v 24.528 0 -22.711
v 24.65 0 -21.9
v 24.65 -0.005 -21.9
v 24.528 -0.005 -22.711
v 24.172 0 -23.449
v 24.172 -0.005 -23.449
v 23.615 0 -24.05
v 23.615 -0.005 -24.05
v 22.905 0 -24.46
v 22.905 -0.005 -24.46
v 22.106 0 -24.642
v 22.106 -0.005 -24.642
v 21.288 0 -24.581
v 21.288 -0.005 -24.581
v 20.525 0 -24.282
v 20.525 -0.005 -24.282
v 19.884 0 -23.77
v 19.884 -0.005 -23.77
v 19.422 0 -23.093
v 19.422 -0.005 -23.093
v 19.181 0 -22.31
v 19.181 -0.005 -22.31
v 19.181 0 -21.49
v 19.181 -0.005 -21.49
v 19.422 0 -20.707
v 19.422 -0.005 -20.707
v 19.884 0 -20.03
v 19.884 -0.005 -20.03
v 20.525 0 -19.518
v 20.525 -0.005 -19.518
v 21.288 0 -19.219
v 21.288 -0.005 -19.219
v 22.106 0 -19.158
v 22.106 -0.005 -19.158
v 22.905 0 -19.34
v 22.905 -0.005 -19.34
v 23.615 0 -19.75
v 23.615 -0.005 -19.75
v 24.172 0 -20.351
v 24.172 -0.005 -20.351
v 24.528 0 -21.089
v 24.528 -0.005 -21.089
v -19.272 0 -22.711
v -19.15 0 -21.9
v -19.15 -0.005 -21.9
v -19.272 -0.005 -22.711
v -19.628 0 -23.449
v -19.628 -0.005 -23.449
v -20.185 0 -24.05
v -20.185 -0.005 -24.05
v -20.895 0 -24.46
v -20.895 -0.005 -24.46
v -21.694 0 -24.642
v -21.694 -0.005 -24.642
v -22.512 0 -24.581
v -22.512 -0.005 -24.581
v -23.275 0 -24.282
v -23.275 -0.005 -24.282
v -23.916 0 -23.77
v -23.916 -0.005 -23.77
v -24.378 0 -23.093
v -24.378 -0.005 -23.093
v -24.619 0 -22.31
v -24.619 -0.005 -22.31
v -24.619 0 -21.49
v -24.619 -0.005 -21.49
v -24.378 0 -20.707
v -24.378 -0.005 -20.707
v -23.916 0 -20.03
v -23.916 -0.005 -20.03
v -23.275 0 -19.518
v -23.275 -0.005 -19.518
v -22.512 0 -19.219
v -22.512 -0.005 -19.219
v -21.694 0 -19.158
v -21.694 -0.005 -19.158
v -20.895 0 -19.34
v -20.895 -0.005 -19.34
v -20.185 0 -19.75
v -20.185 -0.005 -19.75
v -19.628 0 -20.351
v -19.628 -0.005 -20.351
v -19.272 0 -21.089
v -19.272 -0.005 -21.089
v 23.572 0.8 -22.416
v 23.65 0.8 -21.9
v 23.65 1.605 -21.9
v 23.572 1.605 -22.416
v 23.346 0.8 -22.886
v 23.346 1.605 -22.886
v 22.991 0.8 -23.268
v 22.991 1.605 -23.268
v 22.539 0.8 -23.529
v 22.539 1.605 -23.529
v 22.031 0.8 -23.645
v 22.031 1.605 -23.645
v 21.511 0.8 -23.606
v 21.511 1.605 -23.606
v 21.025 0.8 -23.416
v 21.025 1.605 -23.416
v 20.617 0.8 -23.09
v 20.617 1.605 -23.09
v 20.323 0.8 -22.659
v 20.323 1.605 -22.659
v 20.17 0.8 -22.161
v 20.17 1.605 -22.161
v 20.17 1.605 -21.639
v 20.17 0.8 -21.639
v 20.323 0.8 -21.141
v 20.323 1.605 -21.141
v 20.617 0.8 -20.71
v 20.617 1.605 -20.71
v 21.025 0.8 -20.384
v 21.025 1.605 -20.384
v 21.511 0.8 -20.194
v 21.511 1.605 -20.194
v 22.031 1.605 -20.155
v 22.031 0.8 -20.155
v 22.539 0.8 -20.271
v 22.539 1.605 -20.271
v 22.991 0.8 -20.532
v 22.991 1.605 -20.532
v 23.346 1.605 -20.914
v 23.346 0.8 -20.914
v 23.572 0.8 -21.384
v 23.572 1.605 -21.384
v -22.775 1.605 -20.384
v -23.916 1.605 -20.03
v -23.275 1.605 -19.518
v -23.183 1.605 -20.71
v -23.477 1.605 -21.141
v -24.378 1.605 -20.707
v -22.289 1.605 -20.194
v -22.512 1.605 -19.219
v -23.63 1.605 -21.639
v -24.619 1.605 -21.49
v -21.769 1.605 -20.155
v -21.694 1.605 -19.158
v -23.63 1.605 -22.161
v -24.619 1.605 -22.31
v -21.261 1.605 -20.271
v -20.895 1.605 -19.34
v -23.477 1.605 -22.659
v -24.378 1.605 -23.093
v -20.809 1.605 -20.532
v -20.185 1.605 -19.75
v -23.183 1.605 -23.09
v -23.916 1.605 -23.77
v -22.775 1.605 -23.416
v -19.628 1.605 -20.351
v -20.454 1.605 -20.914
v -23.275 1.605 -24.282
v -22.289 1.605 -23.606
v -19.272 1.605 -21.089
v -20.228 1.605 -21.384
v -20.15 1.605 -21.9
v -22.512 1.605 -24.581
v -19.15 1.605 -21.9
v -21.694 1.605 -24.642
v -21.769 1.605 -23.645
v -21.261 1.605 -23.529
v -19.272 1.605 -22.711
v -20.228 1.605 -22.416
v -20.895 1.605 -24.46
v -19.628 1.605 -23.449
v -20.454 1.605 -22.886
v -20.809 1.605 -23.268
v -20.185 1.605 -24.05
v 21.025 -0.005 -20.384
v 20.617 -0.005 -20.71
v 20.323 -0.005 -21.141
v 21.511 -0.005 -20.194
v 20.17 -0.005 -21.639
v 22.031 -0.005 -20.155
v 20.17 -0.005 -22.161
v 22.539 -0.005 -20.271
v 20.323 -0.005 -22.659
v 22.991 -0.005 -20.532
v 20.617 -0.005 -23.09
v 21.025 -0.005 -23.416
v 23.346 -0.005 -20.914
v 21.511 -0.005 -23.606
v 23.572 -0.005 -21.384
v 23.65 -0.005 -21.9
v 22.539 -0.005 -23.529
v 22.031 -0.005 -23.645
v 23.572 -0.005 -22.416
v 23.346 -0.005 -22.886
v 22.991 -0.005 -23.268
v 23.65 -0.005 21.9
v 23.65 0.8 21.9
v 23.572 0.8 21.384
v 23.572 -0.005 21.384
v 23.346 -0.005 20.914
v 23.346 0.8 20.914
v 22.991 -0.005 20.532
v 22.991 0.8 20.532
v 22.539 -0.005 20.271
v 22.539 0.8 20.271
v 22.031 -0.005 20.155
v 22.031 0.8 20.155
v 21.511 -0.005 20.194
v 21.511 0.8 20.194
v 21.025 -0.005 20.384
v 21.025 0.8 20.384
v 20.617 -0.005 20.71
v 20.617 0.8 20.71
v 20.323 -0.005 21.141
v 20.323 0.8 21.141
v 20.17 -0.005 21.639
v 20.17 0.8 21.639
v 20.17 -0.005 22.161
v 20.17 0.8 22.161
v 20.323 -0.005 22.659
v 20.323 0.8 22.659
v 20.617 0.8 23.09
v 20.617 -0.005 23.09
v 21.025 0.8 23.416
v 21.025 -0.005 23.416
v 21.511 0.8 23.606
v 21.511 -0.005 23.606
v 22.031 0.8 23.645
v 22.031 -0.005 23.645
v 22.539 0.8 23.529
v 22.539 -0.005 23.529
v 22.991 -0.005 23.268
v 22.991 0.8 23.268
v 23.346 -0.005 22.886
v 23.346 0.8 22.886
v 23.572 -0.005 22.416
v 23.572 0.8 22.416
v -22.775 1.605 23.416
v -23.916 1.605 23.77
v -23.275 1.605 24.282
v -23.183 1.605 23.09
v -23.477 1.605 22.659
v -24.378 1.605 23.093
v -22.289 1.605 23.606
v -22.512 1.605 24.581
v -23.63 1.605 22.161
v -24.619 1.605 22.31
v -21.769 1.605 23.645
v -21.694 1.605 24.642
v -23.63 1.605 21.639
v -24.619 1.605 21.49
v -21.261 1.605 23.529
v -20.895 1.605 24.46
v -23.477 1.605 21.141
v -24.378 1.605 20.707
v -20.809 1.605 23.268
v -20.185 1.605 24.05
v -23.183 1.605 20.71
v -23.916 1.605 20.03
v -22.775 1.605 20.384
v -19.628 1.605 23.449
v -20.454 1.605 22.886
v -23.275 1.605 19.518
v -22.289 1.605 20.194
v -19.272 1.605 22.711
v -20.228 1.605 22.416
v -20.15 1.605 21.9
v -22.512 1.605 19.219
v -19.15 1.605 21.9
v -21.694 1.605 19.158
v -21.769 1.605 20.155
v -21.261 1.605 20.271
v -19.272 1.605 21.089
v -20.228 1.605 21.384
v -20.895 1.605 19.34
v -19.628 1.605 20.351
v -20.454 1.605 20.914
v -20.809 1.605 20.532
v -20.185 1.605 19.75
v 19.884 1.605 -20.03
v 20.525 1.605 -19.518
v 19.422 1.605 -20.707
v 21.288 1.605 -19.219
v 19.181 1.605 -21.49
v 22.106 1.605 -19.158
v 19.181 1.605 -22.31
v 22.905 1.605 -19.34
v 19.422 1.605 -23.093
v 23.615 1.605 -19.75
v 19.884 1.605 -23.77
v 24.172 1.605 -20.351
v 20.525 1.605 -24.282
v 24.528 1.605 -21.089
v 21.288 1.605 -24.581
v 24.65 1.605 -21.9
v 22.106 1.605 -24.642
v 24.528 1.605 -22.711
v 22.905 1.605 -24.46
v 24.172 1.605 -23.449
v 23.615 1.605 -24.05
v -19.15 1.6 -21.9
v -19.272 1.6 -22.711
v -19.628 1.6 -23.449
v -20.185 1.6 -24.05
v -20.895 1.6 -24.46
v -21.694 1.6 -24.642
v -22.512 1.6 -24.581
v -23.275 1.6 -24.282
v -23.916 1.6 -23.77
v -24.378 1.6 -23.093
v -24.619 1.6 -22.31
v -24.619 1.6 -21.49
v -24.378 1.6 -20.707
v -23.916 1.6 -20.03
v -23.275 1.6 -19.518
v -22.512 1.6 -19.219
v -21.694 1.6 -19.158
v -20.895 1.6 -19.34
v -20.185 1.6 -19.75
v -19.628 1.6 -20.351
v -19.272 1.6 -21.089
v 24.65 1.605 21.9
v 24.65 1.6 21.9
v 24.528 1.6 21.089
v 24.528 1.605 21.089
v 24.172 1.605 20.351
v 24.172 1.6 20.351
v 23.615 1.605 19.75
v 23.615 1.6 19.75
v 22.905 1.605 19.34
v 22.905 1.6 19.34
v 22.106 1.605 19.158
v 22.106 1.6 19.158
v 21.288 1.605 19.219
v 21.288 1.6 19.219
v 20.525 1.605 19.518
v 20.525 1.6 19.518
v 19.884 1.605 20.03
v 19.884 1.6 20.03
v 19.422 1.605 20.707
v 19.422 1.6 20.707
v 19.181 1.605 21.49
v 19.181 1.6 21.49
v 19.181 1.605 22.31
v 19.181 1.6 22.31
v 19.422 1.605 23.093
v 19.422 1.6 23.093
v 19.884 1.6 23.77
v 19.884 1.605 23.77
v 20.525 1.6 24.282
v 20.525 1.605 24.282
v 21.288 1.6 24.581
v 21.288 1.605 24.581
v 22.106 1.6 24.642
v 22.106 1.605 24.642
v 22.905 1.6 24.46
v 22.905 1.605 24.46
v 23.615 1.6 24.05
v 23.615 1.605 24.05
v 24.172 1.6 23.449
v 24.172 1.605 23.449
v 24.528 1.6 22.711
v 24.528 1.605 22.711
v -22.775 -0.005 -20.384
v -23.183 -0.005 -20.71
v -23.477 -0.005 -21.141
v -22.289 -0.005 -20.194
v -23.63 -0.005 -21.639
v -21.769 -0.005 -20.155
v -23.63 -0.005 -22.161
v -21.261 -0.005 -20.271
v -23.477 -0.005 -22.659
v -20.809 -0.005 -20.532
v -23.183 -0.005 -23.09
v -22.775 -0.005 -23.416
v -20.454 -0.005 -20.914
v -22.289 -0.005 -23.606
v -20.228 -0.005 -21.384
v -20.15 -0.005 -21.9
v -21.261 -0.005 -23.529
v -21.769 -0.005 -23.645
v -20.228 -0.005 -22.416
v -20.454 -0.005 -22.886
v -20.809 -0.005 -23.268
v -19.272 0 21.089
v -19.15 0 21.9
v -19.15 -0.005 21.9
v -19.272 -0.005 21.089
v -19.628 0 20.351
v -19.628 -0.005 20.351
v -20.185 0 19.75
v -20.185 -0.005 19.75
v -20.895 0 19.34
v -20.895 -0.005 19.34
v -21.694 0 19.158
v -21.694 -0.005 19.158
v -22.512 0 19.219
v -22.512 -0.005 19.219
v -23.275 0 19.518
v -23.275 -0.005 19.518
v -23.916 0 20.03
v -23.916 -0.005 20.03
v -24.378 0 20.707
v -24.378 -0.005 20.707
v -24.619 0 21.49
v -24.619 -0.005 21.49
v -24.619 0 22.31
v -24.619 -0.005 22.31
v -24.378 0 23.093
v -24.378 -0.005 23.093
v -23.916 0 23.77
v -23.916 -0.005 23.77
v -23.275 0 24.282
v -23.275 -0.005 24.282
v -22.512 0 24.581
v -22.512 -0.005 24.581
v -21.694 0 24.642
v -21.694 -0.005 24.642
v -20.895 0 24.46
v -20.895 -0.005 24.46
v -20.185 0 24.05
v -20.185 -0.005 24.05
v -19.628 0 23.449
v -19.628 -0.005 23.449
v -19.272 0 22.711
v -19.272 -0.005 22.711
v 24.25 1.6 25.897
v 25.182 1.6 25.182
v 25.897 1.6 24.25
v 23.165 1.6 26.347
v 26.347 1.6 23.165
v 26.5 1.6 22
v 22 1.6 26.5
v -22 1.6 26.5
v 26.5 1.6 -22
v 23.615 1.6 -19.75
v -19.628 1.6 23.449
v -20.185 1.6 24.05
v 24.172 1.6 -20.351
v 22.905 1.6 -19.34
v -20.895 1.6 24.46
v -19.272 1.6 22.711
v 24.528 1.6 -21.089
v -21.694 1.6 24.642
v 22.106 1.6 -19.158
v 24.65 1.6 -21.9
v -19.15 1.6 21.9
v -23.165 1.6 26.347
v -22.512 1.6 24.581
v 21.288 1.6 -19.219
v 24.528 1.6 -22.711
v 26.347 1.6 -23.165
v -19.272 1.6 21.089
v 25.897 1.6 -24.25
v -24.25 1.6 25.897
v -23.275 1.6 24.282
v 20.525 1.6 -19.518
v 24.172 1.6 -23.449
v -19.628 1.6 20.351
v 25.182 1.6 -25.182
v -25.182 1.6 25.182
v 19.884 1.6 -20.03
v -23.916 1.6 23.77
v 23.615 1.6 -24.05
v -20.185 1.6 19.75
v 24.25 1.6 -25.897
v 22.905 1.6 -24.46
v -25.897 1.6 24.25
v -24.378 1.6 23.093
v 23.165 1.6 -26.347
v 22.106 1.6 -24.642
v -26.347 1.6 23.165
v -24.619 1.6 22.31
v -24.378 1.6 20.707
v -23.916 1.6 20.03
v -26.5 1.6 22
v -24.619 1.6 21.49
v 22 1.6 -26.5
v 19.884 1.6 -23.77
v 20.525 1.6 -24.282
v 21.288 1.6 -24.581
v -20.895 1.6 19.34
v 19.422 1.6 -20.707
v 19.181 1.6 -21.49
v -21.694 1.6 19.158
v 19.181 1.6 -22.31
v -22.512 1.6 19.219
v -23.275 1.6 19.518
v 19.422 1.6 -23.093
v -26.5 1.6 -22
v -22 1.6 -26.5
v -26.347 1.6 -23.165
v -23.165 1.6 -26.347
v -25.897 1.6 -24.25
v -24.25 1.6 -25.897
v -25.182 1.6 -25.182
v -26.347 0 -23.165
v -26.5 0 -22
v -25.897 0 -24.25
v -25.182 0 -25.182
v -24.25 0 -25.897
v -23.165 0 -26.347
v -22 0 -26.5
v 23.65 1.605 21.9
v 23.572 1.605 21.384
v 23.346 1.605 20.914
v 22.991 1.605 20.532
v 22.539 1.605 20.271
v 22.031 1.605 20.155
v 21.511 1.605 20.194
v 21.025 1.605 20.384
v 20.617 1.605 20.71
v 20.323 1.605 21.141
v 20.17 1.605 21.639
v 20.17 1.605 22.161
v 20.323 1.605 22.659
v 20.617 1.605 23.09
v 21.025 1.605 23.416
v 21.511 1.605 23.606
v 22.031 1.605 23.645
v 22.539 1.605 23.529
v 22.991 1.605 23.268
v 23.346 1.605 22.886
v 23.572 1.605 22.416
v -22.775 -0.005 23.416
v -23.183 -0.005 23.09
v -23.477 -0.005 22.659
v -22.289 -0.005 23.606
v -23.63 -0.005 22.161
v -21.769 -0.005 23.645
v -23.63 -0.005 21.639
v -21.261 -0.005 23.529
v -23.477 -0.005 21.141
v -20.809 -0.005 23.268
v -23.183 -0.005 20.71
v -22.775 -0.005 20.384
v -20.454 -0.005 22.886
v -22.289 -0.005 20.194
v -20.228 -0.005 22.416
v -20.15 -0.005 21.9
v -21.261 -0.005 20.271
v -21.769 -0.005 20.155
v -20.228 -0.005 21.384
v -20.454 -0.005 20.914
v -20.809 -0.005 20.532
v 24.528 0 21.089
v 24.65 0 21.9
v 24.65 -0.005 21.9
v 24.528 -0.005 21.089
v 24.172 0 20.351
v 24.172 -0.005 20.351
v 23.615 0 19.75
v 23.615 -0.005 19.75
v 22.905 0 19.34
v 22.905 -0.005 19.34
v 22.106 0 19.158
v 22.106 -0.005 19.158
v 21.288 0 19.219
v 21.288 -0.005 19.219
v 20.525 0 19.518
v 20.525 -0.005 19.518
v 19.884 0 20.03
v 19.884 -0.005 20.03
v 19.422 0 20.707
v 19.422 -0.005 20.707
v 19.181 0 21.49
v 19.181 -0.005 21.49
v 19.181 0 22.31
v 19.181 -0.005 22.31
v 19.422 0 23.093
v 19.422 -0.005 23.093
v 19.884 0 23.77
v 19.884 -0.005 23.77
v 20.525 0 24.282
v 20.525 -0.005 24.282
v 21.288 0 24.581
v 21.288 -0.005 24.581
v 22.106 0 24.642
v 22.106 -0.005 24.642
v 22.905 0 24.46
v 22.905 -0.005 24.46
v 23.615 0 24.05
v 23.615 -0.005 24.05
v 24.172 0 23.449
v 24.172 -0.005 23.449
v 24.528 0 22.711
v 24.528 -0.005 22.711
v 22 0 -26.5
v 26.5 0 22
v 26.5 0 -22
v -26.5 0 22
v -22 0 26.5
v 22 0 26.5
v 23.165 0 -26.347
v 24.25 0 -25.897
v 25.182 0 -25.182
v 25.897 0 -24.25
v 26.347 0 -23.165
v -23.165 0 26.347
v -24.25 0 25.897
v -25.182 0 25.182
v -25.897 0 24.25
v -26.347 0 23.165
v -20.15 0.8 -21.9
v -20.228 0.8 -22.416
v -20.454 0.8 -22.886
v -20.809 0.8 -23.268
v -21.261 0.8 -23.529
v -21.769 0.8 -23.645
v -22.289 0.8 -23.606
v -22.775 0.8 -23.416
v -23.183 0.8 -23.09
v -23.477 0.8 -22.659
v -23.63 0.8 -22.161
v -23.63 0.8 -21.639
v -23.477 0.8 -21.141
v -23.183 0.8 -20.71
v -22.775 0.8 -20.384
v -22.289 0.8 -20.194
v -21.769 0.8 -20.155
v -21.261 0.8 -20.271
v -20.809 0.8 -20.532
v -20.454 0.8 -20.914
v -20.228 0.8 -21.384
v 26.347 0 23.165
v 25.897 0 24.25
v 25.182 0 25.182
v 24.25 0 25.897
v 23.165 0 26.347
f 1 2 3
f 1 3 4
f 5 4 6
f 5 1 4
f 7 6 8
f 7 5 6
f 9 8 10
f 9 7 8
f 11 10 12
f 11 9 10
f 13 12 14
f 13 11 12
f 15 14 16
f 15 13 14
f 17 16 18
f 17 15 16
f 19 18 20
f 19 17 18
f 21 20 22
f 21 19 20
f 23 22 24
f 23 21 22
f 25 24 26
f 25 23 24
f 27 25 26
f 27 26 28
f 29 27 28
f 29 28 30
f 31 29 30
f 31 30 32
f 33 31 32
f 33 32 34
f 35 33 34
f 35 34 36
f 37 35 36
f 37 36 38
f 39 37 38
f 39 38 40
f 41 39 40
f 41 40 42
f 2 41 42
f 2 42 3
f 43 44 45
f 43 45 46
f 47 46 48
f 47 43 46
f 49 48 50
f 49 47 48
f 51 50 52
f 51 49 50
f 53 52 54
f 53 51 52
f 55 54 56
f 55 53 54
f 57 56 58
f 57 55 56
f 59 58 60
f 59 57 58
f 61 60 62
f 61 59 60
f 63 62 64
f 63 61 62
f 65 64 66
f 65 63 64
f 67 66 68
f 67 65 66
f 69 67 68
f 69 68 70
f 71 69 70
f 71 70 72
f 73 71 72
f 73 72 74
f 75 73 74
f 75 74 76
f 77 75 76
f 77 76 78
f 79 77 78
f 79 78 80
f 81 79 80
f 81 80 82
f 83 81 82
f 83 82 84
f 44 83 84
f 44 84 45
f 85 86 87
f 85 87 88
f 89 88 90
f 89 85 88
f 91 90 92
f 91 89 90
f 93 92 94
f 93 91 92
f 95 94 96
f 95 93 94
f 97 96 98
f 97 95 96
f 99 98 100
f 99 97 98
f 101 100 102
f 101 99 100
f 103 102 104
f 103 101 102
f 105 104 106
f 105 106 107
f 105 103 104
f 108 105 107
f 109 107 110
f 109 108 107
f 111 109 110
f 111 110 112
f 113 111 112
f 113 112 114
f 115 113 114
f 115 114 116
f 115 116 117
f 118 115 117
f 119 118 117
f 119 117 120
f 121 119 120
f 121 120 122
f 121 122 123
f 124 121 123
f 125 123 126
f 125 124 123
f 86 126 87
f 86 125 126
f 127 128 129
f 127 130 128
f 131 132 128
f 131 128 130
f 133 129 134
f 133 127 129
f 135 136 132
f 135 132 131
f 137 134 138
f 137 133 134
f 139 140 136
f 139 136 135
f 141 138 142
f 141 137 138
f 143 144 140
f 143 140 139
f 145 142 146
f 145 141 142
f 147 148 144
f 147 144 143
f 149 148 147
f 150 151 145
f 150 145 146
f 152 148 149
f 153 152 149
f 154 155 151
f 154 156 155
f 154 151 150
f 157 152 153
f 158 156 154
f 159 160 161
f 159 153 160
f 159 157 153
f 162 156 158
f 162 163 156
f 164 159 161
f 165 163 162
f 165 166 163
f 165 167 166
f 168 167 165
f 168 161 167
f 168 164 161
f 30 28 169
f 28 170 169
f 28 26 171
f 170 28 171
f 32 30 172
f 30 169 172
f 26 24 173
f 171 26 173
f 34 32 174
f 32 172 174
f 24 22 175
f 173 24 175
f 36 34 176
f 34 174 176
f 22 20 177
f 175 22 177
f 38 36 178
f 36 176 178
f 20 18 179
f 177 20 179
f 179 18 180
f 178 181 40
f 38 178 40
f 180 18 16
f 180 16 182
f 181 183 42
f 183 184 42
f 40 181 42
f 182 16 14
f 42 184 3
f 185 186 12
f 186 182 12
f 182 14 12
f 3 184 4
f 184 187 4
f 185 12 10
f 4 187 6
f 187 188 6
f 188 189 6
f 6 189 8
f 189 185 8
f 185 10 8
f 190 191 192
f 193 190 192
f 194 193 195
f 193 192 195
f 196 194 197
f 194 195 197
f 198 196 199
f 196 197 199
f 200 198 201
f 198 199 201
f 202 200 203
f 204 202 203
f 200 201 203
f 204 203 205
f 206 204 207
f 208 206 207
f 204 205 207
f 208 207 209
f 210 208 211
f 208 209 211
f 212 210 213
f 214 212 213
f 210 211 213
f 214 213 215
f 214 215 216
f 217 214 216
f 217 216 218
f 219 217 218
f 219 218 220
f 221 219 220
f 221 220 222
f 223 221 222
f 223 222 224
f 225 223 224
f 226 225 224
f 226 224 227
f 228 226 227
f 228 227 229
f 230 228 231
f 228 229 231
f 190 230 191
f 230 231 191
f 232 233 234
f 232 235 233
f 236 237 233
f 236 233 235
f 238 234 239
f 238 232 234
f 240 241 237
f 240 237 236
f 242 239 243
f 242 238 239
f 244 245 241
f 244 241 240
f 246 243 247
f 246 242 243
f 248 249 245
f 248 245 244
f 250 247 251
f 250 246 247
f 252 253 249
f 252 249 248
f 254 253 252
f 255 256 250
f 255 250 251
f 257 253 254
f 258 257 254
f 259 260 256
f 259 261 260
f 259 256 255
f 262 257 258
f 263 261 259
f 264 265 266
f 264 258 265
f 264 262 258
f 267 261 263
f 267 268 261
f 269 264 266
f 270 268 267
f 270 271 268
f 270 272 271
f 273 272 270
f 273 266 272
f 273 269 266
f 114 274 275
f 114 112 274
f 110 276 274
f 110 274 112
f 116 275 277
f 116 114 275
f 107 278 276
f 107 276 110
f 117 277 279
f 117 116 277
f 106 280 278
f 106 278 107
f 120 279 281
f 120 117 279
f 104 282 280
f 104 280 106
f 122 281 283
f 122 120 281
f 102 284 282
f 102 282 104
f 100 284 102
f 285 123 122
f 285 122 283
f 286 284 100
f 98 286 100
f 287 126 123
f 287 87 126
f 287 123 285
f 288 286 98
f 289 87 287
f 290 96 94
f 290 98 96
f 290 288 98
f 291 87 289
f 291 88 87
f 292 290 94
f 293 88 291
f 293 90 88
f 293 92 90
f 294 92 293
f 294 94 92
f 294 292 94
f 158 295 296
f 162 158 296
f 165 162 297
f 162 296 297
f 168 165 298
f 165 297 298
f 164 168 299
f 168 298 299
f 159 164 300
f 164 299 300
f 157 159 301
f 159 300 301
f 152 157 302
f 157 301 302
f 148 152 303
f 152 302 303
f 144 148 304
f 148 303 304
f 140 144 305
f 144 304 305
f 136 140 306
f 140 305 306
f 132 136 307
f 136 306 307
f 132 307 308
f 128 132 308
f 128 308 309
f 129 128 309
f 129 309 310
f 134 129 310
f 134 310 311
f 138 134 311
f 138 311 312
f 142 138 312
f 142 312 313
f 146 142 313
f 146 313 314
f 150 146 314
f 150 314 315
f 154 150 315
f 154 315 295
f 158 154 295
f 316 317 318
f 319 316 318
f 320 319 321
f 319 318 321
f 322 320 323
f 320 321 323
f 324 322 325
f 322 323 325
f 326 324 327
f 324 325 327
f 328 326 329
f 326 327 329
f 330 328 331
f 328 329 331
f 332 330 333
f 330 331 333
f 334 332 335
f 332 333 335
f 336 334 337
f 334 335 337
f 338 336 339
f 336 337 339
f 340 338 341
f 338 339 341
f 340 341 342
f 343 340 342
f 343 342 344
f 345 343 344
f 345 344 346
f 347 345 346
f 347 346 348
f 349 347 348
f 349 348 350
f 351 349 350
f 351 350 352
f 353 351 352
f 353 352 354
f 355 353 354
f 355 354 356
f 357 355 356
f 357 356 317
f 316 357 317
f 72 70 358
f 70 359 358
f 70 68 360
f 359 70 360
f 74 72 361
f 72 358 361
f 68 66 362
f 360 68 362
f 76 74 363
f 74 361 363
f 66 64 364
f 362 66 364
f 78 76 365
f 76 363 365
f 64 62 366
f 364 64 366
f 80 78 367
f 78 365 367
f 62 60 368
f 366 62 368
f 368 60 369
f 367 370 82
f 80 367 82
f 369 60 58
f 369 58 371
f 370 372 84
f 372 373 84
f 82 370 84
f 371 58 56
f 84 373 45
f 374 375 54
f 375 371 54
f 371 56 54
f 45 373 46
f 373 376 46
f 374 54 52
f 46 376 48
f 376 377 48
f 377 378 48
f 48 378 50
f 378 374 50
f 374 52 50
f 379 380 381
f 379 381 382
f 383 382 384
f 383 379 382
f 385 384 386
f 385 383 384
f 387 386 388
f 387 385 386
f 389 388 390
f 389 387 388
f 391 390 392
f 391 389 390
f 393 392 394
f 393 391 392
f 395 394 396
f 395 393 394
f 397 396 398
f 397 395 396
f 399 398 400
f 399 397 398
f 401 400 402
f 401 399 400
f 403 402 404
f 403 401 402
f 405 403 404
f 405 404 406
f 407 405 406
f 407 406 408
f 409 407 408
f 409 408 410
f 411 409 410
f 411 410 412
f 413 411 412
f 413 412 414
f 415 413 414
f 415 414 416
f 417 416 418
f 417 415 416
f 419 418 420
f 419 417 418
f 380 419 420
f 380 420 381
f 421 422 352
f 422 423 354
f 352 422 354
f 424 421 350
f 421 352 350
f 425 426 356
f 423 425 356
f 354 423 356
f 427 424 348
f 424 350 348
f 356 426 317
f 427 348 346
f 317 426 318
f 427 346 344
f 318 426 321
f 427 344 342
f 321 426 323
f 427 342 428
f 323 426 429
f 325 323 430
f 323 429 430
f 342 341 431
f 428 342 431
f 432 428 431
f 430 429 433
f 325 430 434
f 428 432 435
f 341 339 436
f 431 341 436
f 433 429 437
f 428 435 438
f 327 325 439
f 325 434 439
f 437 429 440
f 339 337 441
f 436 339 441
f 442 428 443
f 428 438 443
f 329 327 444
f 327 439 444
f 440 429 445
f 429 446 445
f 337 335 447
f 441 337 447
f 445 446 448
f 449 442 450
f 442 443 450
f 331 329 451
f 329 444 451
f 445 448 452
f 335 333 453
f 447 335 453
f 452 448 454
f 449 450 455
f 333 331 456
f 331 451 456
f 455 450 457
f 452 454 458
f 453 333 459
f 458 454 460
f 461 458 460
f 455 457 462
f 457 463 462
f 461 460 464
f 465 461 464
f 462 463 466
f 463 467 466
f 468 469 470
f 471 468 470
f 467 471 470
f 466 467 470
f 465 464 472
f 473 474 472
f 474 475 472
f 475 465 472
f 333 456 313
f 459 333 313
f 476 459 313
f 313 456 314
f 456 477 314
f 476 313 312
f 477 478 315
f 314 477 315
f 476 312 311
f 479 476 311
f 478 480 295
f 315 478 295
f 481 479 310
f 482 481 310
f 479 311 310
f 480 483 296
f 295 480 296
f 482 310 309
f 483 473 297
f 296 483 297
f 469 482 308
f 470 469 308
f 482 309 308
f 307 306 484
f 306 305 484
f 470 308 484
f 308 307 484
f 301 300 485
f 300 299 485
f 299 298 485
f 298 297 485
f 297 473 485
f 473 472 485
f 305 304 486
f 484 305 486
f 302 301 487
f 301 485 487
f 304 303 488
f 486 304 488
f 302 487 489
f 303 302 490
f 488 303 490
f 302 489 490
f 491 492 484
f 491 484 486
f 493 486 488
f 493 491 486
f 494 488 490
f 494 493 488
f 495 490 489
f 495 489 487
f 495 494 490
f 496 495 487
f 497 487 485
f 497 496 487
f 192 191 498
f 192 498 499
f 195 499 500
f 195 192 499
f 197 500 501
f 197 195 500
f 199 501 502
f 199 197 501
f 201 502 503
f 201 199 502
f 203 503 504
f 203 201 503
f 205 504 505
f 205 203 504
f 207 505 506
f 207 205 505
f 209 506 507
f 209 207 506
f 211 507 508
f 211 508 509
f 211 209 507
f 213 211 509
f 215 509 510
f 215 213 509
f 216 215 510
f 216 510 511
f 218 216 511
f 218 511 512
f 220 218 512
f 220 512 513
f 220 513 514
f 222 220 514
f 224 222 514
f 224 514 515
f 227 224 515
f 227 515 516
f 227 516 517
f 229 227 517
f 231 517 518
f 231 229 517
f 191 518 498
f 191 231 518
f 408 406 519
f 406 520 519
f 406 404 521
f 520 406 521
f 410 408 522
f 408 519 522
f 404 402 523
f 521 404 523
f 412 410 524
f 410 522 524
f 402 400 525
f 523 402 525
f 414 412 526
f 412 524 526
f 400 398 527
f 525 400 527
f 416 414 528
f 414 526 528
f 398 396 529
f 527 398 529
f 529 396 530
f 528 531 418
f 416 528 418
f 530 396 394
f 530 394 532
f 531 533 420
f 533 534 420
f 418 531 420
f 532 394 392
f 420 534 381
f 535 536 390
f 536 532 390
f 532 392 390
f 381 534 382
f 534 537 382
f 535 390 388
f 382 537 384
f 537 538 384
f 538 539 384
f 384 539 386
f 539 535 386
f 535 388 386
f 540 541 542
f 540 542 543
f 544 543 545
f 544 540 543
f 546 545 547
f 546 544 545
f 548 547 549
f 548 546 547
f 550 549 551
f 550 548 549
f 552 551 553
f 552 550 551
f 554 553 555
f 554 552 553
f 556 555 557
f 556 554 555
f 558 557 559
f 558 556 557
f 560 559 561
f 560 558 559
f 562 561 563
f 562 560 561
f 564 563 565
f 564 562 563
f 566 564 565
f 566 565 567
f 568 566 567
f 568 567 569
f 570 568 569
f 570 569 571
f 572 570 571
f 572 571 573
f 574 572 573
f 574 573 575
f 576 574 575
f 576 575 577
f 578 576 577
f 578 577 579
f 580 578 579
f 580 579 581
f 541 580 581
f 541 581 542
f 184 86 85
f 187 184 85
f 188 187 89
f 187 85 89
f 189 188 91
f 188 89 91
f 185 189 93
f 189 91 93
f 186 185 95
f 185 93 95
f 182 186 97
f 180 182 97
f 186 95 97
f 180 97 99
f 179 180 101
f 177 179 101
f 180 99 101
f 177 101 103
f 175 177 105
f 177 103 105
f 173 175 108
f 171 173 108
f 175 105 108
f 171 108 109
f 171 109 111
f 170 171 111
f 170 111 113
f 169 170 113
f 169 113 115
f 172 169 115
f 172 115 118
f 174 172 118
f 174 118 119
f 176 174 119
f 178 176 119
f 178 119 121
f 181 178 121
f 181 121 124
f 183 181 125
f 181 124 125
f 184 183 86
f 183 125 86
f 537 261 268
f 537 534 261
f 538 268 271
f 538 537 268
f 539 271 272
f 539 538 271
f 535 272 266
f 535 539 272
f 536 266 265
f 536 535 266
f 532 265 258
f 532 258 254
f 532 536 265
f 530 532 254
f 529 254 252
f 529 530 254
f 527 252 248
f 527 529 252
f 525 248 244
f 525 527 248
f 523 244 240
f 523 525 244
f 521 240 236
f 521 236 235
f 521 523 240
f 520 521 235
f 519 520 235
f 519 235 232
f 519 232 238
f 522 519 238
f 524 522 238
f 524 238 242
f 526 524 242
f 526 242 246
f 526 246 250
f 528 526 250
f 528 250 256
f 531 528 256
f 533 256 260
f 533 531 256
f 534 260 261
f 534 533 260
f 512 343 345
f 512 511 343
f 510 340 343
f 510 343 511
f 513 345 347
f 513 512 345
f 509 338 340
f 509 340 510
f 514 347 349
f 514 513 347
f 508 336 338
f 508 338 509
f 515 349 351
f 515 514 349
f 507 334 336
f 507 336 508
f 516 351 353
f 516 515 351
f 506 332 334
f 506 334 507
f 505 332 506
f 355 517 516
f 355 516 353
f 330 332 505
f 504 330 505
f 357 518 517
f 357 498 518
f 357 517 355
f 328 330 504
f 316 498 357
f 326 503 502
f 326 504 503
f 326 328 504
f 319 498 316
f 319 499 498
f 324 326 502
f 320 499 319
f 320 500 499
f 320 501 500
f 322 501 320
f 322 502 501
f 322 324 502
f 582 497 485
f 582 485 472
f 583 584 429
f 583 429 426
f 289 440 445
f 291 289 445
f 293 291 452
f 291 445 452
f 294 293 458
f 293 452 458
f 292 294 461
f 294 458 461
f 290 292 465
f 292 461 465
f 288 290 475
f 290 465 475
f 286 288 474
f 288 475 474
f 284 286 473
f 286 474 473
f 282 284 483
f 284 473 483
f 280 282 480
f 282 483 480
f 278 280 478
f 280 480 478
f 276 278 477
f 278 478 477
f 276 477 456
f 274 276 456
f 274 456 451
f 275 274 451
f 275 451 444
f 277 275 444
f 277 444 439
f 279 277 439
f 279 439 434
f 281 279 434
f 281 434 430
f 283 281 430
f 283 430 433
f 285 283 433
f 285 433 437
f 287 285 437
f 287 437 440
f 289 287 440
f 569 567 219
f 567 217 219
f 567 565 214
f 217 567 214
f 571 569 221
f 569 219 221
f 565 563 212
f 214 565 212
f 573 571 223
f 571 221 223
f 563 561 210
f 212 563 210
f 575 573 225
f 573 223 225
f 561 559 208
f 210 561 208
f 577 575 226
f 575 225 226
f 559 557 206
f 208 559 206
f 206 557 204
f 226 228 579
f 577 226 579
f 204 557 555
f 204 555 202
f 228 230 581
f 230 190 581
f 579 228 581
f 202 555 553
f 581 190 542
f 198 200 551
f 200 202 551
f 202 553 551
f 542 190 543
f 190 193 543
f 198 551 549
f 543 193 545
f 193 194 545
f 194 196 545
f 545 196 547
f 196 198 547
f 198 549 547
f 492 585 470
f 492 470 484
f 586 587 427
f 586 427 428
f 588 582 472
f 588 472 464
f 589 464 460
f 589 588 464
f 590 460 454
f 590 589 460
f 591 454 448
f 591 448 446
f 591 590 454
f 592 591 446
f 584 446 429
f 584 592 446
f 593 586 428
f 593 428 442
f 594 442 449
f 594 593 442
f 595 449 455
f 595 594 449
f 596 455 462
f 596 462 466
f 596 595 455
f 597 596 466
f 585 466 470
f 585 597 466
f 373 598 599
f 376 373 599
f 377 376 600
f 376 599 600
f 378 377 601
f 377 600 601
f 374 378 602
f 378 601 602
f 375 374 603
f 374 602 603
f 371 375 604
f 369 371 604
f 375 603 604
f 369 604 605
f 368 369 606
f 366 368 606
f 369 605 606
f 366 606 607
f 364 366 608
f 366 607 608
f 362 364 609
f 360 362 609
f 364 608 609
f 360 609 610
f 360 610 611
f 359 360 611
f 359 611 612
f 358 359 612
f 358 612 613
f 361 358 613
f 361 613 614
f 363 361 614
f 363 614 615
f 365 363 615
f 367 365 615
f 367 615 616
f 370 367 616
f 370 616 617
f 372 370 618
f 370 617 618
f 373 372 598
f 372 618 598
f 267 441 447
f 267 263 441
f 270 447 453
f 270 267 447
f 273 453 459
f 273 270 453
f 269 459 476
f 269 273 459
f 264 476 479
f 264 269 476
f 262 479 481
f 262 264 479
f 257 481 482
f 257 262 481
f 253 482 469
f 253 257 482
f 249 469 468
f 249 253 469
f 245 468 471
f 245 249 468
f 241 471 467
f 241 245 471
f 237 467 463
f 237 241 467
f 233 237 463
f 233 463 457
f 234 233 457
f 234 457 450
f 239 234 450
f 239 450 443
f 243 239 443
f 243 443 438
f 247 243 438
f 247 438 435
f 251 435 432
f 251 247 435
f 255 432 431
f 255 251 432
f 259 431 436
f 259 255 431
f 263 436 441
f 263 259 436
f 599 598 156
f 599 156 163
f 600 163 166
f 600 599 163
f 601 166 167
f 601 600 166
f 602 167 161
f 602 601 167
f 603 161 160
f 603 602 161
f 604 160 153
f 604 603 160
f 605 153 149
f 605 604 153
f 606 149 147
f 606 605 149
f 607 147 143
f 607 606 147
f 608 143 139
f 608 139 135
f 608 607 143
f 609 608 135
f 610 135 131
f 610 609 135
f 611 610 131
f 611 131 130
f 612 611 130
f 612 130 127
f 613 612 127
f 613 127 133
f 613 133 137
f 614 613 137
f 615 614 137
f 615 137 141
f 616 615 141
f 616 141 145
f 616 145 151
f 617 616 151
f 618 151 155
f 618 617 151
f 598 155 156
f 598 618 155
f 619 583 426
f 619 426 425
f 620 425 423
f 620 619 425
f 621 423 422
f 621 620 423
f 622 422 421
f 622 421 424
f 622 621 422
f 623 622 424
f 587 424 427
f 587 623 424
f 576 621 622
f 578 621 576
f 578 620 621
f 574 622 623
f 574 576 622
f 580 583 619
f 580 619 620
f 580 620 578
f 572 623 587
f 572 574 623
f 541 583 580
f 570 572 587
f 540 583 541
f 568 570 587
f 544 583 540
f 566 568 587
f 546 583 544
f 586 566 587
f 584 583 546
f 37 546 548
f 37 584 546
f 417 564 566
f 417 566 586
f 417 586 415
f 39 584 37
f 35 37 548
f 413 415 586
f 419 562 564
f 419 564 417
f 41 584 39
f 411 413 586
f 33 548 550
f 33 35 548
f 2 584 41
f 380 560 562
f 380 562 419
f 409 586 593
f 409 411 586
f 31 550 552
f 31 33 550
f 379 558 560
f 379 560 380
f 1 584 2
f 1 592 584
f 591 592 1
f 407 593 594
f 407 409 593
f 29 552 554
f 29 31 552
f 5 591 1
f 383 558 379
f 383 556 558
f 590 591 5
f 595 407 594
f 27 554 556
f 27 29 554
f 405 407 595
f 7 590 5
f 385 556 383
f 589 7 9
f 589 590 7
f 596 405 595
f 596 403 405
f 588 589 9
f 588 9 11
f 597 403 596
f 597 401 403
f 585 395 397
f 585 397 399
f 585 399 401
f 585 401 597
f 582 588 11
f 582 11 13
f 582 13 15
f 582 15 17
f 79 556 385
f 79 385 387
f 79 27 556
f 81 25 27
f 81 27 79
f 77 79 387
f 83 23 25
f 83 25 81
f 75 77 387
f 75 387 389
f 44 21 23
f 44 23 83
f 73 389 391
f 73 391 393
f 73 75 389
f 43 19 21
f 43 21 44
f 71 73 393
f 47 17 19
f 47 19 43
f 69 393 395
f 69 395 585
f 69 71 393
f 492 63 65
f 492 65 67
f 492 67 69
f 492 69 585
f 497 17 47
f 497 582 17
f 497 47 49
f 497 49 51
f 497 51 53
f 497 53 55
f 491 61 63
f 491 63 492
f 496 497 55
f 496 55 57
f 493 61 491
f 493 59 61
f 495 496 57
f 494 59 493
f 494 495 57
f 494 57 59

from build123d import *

# Parameters (mm, degrees)
SKETCH1_R           = 1.755
BOSS_EXTRUDE1_DEPTH = 1.6
BOSS_EXTRUDE2_START = 0.8
SKETCH2_R           = 2.75
SKETCH2_R_2         = 1.75
BOSS_EXTRUDE2_DEPTH = 0.805


with BuildPart() as part:
    # Sketch1 → Boss-Extrude1 (new body)
    with BuildSketch(Plane(origin=(0, 0, 0), x_dir=(1, 0, 0), z_dir=(0, 1, 0))):
        with BuildLine():
            Line((22, -26.5), (-22, -26.5))
            ThreePointArc((-22, -26.5), (-25.181980515, -25.181980515), (-26.5, -22))
            Line((-26.5, -22), (-26.5, 22))
            ThreePointArc((-26.5, 22), (-25.181980515, 25.181980515), (-22, 26.5))
            Line((-22, 26.5), (22, 26.5))
            ThreePointArc((22, 26.5), (25.181980515, 25.181980515), (26.5, 22))
            Line((26.5, 22), (26.5, -22))
            ThreePointArc((26.5, -22), (25.181980515, -25.181980515), (22, -26.5))
        make_face()
        with Locations((-21.9, 21.9)):
            Circle(SKETCH1_R, mode=Mode.SUBTRACT)
        with Locations((21.9, 21.9)):
            Circle(SKETCH1_R, mode=Mode.SUBTRACT)
        with Locations((-21.9, -21.9)):
            Circle(SKETCH1_R, mode=Mode.SUBTRACT)
        with Locations((21.9, -21.9)):
            Circle(SKETCH1_R, mode=Mode.SUBTRACT)
    extrude(amount=BOSS_EXTRUDE1_DEPTH)

    # Sketch2 → Boss-Extrude2 (add, symmetric)
    with BuildSketch(Plane(origin=(0, 0, 0), x_dir=(1, 0, 0), z_dir=(0, 1, 0)).offset(BOSS_EXTRUDE2_START)):
        with Locations((-21.9, 21.9)):
            Circle(SKETCH2_R)
        with Locations((-21.9, 21.9)):
            Circle(SKETCH2_R_2, mode=Mode.SUBTRACT)
        with Locations((21.9, 21.9)):
            Circle(SKETCH2_R)
        with Locations((21.9, 21.9)):
            Circle(SKETCH2_R_2, mode=Mode.SUBTRACT)
        with Locations((21.9, -21.9)):
            Circle(SKETCH2_R)
        with Locations((21.9, -21.9)):
            Circle(SKETCH2_R_2, mode=Mode.SUBTRACT)
        with Locations((-21.9, -21.9)):
            Circle(SKETCH2_R)
        with Locations((-21.9, -21.9)):
            Circle(SKETCH2_R_2, mode=Mode.SUBTRACT)
    extrude(amount=BOSS_EXTRUDE2_DEPTH, both=True)


solid = part.part
